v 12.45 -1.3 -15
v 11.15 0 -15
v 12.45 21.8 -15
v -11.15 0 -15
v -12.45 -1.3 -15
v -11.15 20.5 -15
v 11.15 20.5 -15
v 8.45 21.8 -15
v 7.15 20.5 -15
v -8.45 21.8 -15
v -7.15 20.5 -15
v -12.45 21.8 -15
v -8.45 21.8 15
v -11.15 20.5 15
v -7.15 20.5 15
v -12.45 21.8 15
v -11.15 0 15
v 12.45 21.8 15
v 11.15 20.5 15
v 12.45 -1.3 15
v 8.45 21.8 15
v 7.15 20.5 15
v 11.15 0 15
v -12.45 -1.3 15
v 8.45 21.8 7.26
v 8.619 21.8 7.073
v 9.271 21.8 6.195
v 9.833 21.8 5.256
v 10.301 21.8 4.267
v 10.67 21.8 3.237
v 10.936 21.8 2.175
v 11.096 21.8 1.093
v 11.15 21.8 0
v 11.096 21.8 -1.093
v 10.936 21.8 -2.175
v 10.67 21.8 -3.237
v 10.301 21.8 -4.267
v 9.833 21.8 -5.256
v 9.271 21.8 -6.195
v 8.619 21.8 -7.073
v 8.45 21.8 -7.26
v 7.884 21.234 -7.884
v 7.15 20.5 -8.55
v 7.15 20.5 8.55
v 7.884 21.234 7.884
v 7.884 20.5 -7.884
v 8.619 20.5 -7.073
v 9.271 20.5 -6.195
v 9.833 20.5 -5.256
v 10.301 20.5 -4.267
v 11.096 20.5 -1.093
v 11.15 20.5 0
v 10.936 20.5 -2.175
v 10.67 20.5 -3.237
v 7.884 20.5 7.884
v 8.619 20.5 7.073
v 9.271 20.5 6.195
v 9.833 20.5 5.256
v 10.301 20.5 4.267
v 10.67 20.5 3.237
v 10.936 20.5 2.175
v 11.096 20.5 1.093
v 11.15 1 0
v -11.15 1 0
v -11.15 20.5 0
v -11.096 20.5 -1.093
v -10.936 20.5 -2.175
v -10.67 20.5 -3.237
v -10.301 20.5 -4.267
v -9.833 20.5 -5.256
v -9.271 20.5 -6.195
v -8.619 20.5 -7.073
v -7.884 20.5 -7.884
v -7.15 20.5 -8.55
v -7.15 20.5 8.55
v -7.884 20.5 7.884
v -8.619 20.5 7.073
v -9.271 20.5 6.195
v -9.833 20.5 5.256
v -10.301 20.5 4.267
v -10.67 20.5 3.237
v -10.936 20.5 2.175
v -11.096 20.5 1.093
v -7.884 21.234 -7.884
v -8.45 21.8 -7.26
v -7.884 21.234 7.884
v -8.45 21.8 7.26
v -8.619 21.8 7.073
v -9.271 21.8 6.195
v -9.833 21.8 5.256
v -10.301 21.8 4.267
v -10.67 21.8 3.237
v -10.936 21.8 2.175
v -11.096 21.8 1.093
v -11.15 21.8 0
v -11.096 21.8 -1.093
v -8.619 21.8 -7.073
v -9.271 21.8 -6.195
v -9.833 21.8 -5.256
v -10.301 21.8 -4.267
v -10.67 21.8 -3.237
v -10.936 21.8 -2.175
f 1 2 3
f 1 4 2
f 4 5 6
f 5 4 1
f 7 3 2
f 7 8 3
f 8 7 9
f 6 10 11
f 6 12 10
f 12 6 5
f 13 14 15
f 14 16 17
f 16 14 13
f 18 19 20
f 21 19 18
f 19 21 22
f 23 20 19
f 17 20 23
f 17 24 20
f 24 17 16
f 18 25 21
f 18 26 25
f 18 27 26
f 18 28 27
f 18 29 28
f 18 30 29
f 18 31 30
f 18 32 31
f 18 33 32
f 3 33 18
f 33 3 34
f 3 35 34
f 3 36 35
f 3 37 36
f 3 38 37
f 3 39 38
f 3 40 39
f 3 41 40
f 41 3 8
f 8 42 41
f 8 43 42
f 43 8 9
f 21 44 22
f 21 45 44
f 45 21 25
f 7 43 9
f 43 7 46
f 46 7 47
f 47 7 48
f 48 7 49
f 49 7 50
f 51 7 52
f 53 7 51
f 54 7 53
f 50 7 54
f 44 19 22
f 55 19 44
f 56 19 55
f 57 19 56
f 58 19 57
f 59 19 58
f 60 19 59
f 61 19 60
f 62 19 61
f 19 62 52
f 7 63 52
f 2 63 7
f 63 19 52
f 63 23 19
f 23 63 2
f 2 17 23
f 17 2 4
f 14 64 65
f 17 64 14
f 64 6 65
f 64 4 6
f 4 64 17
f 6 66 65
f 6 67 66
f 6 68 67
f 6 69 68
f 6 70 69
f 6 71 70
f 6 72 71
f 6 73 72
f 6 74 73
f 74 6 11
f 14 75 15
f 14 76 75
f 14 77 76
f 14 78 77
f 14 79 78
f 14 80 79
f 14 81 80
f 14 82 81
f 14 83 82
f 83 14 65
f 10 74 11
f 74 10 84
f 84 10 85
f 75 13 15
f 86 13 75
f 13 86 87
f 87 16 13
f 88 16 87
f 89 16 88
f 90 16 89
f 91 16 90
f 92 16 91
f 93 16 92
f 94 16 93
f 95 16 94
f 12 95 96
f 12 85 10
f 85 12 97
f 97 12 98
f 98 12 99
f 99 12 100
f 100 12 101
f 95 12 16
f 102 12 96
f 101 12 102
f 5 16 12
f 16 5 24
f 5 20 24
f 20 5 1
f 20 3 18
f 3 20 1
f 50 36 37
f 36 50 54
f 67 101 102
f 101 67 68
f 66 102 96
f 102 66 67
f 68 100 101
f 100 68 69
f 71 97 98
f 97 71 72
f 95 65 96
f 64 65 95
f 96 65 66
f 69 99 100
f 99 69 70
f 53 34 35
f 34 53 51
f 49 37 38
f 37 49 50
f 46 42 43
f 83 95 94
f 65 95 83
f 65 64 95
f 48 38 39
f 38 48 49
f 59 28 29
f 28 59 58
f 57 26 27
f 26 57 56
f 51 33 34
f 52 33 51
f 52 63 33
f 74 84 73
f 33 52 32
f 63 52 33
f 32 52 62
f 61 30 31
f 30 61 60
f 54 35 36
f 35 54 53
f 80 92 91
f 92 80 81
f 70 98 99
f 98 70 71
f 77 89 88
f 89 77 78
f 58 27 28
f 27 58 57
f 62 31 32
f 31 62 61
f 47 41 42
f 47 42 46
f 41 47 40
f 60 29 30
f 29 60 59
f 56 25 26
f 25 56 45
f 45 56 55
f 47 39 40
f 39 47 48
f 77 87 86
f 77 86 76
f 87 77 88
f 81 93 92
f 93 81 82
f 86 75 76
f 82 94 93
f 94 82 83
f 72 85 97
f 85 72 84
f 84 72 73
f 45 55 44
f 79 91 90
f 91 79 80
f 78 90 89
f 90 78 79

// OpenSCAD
$fn=64;
width = 30;
channel_width = 22.3;
latch_height = 2;
overhang = 4;
inner_h = 2.6*2 + 15.1 + 0.2;
thickness = 1.3;

outer_x = channel_width/2 + thickness;

difference() {
  linear_extrude(width, center=true)
  polygon([
    [-outer_x, -thickness],
    [-outer_x, inner_h + thickness],
    [-channel_width/2 + overhang - thickness, inner_h + thickness],
    [-channel_width/2 + overhang, inner_h],
    [-channel_width/2, inner_h],
    [-channel_width/2, 0],
    [channel_width/2, 0],
    [channel_width/2, inner_h],
    [channel_width/2 - overhang, inner_h],
    [channel_width/2 - overhang + thickness, inner_h + thickness],
    [outer_x, inner_h + thickness],
    [outer_x, -thickness],
  ]);

  translate([0,1,0])
  rotate([-90,0,0])
  cylinder(h=100, r=channel_width/2);
}
